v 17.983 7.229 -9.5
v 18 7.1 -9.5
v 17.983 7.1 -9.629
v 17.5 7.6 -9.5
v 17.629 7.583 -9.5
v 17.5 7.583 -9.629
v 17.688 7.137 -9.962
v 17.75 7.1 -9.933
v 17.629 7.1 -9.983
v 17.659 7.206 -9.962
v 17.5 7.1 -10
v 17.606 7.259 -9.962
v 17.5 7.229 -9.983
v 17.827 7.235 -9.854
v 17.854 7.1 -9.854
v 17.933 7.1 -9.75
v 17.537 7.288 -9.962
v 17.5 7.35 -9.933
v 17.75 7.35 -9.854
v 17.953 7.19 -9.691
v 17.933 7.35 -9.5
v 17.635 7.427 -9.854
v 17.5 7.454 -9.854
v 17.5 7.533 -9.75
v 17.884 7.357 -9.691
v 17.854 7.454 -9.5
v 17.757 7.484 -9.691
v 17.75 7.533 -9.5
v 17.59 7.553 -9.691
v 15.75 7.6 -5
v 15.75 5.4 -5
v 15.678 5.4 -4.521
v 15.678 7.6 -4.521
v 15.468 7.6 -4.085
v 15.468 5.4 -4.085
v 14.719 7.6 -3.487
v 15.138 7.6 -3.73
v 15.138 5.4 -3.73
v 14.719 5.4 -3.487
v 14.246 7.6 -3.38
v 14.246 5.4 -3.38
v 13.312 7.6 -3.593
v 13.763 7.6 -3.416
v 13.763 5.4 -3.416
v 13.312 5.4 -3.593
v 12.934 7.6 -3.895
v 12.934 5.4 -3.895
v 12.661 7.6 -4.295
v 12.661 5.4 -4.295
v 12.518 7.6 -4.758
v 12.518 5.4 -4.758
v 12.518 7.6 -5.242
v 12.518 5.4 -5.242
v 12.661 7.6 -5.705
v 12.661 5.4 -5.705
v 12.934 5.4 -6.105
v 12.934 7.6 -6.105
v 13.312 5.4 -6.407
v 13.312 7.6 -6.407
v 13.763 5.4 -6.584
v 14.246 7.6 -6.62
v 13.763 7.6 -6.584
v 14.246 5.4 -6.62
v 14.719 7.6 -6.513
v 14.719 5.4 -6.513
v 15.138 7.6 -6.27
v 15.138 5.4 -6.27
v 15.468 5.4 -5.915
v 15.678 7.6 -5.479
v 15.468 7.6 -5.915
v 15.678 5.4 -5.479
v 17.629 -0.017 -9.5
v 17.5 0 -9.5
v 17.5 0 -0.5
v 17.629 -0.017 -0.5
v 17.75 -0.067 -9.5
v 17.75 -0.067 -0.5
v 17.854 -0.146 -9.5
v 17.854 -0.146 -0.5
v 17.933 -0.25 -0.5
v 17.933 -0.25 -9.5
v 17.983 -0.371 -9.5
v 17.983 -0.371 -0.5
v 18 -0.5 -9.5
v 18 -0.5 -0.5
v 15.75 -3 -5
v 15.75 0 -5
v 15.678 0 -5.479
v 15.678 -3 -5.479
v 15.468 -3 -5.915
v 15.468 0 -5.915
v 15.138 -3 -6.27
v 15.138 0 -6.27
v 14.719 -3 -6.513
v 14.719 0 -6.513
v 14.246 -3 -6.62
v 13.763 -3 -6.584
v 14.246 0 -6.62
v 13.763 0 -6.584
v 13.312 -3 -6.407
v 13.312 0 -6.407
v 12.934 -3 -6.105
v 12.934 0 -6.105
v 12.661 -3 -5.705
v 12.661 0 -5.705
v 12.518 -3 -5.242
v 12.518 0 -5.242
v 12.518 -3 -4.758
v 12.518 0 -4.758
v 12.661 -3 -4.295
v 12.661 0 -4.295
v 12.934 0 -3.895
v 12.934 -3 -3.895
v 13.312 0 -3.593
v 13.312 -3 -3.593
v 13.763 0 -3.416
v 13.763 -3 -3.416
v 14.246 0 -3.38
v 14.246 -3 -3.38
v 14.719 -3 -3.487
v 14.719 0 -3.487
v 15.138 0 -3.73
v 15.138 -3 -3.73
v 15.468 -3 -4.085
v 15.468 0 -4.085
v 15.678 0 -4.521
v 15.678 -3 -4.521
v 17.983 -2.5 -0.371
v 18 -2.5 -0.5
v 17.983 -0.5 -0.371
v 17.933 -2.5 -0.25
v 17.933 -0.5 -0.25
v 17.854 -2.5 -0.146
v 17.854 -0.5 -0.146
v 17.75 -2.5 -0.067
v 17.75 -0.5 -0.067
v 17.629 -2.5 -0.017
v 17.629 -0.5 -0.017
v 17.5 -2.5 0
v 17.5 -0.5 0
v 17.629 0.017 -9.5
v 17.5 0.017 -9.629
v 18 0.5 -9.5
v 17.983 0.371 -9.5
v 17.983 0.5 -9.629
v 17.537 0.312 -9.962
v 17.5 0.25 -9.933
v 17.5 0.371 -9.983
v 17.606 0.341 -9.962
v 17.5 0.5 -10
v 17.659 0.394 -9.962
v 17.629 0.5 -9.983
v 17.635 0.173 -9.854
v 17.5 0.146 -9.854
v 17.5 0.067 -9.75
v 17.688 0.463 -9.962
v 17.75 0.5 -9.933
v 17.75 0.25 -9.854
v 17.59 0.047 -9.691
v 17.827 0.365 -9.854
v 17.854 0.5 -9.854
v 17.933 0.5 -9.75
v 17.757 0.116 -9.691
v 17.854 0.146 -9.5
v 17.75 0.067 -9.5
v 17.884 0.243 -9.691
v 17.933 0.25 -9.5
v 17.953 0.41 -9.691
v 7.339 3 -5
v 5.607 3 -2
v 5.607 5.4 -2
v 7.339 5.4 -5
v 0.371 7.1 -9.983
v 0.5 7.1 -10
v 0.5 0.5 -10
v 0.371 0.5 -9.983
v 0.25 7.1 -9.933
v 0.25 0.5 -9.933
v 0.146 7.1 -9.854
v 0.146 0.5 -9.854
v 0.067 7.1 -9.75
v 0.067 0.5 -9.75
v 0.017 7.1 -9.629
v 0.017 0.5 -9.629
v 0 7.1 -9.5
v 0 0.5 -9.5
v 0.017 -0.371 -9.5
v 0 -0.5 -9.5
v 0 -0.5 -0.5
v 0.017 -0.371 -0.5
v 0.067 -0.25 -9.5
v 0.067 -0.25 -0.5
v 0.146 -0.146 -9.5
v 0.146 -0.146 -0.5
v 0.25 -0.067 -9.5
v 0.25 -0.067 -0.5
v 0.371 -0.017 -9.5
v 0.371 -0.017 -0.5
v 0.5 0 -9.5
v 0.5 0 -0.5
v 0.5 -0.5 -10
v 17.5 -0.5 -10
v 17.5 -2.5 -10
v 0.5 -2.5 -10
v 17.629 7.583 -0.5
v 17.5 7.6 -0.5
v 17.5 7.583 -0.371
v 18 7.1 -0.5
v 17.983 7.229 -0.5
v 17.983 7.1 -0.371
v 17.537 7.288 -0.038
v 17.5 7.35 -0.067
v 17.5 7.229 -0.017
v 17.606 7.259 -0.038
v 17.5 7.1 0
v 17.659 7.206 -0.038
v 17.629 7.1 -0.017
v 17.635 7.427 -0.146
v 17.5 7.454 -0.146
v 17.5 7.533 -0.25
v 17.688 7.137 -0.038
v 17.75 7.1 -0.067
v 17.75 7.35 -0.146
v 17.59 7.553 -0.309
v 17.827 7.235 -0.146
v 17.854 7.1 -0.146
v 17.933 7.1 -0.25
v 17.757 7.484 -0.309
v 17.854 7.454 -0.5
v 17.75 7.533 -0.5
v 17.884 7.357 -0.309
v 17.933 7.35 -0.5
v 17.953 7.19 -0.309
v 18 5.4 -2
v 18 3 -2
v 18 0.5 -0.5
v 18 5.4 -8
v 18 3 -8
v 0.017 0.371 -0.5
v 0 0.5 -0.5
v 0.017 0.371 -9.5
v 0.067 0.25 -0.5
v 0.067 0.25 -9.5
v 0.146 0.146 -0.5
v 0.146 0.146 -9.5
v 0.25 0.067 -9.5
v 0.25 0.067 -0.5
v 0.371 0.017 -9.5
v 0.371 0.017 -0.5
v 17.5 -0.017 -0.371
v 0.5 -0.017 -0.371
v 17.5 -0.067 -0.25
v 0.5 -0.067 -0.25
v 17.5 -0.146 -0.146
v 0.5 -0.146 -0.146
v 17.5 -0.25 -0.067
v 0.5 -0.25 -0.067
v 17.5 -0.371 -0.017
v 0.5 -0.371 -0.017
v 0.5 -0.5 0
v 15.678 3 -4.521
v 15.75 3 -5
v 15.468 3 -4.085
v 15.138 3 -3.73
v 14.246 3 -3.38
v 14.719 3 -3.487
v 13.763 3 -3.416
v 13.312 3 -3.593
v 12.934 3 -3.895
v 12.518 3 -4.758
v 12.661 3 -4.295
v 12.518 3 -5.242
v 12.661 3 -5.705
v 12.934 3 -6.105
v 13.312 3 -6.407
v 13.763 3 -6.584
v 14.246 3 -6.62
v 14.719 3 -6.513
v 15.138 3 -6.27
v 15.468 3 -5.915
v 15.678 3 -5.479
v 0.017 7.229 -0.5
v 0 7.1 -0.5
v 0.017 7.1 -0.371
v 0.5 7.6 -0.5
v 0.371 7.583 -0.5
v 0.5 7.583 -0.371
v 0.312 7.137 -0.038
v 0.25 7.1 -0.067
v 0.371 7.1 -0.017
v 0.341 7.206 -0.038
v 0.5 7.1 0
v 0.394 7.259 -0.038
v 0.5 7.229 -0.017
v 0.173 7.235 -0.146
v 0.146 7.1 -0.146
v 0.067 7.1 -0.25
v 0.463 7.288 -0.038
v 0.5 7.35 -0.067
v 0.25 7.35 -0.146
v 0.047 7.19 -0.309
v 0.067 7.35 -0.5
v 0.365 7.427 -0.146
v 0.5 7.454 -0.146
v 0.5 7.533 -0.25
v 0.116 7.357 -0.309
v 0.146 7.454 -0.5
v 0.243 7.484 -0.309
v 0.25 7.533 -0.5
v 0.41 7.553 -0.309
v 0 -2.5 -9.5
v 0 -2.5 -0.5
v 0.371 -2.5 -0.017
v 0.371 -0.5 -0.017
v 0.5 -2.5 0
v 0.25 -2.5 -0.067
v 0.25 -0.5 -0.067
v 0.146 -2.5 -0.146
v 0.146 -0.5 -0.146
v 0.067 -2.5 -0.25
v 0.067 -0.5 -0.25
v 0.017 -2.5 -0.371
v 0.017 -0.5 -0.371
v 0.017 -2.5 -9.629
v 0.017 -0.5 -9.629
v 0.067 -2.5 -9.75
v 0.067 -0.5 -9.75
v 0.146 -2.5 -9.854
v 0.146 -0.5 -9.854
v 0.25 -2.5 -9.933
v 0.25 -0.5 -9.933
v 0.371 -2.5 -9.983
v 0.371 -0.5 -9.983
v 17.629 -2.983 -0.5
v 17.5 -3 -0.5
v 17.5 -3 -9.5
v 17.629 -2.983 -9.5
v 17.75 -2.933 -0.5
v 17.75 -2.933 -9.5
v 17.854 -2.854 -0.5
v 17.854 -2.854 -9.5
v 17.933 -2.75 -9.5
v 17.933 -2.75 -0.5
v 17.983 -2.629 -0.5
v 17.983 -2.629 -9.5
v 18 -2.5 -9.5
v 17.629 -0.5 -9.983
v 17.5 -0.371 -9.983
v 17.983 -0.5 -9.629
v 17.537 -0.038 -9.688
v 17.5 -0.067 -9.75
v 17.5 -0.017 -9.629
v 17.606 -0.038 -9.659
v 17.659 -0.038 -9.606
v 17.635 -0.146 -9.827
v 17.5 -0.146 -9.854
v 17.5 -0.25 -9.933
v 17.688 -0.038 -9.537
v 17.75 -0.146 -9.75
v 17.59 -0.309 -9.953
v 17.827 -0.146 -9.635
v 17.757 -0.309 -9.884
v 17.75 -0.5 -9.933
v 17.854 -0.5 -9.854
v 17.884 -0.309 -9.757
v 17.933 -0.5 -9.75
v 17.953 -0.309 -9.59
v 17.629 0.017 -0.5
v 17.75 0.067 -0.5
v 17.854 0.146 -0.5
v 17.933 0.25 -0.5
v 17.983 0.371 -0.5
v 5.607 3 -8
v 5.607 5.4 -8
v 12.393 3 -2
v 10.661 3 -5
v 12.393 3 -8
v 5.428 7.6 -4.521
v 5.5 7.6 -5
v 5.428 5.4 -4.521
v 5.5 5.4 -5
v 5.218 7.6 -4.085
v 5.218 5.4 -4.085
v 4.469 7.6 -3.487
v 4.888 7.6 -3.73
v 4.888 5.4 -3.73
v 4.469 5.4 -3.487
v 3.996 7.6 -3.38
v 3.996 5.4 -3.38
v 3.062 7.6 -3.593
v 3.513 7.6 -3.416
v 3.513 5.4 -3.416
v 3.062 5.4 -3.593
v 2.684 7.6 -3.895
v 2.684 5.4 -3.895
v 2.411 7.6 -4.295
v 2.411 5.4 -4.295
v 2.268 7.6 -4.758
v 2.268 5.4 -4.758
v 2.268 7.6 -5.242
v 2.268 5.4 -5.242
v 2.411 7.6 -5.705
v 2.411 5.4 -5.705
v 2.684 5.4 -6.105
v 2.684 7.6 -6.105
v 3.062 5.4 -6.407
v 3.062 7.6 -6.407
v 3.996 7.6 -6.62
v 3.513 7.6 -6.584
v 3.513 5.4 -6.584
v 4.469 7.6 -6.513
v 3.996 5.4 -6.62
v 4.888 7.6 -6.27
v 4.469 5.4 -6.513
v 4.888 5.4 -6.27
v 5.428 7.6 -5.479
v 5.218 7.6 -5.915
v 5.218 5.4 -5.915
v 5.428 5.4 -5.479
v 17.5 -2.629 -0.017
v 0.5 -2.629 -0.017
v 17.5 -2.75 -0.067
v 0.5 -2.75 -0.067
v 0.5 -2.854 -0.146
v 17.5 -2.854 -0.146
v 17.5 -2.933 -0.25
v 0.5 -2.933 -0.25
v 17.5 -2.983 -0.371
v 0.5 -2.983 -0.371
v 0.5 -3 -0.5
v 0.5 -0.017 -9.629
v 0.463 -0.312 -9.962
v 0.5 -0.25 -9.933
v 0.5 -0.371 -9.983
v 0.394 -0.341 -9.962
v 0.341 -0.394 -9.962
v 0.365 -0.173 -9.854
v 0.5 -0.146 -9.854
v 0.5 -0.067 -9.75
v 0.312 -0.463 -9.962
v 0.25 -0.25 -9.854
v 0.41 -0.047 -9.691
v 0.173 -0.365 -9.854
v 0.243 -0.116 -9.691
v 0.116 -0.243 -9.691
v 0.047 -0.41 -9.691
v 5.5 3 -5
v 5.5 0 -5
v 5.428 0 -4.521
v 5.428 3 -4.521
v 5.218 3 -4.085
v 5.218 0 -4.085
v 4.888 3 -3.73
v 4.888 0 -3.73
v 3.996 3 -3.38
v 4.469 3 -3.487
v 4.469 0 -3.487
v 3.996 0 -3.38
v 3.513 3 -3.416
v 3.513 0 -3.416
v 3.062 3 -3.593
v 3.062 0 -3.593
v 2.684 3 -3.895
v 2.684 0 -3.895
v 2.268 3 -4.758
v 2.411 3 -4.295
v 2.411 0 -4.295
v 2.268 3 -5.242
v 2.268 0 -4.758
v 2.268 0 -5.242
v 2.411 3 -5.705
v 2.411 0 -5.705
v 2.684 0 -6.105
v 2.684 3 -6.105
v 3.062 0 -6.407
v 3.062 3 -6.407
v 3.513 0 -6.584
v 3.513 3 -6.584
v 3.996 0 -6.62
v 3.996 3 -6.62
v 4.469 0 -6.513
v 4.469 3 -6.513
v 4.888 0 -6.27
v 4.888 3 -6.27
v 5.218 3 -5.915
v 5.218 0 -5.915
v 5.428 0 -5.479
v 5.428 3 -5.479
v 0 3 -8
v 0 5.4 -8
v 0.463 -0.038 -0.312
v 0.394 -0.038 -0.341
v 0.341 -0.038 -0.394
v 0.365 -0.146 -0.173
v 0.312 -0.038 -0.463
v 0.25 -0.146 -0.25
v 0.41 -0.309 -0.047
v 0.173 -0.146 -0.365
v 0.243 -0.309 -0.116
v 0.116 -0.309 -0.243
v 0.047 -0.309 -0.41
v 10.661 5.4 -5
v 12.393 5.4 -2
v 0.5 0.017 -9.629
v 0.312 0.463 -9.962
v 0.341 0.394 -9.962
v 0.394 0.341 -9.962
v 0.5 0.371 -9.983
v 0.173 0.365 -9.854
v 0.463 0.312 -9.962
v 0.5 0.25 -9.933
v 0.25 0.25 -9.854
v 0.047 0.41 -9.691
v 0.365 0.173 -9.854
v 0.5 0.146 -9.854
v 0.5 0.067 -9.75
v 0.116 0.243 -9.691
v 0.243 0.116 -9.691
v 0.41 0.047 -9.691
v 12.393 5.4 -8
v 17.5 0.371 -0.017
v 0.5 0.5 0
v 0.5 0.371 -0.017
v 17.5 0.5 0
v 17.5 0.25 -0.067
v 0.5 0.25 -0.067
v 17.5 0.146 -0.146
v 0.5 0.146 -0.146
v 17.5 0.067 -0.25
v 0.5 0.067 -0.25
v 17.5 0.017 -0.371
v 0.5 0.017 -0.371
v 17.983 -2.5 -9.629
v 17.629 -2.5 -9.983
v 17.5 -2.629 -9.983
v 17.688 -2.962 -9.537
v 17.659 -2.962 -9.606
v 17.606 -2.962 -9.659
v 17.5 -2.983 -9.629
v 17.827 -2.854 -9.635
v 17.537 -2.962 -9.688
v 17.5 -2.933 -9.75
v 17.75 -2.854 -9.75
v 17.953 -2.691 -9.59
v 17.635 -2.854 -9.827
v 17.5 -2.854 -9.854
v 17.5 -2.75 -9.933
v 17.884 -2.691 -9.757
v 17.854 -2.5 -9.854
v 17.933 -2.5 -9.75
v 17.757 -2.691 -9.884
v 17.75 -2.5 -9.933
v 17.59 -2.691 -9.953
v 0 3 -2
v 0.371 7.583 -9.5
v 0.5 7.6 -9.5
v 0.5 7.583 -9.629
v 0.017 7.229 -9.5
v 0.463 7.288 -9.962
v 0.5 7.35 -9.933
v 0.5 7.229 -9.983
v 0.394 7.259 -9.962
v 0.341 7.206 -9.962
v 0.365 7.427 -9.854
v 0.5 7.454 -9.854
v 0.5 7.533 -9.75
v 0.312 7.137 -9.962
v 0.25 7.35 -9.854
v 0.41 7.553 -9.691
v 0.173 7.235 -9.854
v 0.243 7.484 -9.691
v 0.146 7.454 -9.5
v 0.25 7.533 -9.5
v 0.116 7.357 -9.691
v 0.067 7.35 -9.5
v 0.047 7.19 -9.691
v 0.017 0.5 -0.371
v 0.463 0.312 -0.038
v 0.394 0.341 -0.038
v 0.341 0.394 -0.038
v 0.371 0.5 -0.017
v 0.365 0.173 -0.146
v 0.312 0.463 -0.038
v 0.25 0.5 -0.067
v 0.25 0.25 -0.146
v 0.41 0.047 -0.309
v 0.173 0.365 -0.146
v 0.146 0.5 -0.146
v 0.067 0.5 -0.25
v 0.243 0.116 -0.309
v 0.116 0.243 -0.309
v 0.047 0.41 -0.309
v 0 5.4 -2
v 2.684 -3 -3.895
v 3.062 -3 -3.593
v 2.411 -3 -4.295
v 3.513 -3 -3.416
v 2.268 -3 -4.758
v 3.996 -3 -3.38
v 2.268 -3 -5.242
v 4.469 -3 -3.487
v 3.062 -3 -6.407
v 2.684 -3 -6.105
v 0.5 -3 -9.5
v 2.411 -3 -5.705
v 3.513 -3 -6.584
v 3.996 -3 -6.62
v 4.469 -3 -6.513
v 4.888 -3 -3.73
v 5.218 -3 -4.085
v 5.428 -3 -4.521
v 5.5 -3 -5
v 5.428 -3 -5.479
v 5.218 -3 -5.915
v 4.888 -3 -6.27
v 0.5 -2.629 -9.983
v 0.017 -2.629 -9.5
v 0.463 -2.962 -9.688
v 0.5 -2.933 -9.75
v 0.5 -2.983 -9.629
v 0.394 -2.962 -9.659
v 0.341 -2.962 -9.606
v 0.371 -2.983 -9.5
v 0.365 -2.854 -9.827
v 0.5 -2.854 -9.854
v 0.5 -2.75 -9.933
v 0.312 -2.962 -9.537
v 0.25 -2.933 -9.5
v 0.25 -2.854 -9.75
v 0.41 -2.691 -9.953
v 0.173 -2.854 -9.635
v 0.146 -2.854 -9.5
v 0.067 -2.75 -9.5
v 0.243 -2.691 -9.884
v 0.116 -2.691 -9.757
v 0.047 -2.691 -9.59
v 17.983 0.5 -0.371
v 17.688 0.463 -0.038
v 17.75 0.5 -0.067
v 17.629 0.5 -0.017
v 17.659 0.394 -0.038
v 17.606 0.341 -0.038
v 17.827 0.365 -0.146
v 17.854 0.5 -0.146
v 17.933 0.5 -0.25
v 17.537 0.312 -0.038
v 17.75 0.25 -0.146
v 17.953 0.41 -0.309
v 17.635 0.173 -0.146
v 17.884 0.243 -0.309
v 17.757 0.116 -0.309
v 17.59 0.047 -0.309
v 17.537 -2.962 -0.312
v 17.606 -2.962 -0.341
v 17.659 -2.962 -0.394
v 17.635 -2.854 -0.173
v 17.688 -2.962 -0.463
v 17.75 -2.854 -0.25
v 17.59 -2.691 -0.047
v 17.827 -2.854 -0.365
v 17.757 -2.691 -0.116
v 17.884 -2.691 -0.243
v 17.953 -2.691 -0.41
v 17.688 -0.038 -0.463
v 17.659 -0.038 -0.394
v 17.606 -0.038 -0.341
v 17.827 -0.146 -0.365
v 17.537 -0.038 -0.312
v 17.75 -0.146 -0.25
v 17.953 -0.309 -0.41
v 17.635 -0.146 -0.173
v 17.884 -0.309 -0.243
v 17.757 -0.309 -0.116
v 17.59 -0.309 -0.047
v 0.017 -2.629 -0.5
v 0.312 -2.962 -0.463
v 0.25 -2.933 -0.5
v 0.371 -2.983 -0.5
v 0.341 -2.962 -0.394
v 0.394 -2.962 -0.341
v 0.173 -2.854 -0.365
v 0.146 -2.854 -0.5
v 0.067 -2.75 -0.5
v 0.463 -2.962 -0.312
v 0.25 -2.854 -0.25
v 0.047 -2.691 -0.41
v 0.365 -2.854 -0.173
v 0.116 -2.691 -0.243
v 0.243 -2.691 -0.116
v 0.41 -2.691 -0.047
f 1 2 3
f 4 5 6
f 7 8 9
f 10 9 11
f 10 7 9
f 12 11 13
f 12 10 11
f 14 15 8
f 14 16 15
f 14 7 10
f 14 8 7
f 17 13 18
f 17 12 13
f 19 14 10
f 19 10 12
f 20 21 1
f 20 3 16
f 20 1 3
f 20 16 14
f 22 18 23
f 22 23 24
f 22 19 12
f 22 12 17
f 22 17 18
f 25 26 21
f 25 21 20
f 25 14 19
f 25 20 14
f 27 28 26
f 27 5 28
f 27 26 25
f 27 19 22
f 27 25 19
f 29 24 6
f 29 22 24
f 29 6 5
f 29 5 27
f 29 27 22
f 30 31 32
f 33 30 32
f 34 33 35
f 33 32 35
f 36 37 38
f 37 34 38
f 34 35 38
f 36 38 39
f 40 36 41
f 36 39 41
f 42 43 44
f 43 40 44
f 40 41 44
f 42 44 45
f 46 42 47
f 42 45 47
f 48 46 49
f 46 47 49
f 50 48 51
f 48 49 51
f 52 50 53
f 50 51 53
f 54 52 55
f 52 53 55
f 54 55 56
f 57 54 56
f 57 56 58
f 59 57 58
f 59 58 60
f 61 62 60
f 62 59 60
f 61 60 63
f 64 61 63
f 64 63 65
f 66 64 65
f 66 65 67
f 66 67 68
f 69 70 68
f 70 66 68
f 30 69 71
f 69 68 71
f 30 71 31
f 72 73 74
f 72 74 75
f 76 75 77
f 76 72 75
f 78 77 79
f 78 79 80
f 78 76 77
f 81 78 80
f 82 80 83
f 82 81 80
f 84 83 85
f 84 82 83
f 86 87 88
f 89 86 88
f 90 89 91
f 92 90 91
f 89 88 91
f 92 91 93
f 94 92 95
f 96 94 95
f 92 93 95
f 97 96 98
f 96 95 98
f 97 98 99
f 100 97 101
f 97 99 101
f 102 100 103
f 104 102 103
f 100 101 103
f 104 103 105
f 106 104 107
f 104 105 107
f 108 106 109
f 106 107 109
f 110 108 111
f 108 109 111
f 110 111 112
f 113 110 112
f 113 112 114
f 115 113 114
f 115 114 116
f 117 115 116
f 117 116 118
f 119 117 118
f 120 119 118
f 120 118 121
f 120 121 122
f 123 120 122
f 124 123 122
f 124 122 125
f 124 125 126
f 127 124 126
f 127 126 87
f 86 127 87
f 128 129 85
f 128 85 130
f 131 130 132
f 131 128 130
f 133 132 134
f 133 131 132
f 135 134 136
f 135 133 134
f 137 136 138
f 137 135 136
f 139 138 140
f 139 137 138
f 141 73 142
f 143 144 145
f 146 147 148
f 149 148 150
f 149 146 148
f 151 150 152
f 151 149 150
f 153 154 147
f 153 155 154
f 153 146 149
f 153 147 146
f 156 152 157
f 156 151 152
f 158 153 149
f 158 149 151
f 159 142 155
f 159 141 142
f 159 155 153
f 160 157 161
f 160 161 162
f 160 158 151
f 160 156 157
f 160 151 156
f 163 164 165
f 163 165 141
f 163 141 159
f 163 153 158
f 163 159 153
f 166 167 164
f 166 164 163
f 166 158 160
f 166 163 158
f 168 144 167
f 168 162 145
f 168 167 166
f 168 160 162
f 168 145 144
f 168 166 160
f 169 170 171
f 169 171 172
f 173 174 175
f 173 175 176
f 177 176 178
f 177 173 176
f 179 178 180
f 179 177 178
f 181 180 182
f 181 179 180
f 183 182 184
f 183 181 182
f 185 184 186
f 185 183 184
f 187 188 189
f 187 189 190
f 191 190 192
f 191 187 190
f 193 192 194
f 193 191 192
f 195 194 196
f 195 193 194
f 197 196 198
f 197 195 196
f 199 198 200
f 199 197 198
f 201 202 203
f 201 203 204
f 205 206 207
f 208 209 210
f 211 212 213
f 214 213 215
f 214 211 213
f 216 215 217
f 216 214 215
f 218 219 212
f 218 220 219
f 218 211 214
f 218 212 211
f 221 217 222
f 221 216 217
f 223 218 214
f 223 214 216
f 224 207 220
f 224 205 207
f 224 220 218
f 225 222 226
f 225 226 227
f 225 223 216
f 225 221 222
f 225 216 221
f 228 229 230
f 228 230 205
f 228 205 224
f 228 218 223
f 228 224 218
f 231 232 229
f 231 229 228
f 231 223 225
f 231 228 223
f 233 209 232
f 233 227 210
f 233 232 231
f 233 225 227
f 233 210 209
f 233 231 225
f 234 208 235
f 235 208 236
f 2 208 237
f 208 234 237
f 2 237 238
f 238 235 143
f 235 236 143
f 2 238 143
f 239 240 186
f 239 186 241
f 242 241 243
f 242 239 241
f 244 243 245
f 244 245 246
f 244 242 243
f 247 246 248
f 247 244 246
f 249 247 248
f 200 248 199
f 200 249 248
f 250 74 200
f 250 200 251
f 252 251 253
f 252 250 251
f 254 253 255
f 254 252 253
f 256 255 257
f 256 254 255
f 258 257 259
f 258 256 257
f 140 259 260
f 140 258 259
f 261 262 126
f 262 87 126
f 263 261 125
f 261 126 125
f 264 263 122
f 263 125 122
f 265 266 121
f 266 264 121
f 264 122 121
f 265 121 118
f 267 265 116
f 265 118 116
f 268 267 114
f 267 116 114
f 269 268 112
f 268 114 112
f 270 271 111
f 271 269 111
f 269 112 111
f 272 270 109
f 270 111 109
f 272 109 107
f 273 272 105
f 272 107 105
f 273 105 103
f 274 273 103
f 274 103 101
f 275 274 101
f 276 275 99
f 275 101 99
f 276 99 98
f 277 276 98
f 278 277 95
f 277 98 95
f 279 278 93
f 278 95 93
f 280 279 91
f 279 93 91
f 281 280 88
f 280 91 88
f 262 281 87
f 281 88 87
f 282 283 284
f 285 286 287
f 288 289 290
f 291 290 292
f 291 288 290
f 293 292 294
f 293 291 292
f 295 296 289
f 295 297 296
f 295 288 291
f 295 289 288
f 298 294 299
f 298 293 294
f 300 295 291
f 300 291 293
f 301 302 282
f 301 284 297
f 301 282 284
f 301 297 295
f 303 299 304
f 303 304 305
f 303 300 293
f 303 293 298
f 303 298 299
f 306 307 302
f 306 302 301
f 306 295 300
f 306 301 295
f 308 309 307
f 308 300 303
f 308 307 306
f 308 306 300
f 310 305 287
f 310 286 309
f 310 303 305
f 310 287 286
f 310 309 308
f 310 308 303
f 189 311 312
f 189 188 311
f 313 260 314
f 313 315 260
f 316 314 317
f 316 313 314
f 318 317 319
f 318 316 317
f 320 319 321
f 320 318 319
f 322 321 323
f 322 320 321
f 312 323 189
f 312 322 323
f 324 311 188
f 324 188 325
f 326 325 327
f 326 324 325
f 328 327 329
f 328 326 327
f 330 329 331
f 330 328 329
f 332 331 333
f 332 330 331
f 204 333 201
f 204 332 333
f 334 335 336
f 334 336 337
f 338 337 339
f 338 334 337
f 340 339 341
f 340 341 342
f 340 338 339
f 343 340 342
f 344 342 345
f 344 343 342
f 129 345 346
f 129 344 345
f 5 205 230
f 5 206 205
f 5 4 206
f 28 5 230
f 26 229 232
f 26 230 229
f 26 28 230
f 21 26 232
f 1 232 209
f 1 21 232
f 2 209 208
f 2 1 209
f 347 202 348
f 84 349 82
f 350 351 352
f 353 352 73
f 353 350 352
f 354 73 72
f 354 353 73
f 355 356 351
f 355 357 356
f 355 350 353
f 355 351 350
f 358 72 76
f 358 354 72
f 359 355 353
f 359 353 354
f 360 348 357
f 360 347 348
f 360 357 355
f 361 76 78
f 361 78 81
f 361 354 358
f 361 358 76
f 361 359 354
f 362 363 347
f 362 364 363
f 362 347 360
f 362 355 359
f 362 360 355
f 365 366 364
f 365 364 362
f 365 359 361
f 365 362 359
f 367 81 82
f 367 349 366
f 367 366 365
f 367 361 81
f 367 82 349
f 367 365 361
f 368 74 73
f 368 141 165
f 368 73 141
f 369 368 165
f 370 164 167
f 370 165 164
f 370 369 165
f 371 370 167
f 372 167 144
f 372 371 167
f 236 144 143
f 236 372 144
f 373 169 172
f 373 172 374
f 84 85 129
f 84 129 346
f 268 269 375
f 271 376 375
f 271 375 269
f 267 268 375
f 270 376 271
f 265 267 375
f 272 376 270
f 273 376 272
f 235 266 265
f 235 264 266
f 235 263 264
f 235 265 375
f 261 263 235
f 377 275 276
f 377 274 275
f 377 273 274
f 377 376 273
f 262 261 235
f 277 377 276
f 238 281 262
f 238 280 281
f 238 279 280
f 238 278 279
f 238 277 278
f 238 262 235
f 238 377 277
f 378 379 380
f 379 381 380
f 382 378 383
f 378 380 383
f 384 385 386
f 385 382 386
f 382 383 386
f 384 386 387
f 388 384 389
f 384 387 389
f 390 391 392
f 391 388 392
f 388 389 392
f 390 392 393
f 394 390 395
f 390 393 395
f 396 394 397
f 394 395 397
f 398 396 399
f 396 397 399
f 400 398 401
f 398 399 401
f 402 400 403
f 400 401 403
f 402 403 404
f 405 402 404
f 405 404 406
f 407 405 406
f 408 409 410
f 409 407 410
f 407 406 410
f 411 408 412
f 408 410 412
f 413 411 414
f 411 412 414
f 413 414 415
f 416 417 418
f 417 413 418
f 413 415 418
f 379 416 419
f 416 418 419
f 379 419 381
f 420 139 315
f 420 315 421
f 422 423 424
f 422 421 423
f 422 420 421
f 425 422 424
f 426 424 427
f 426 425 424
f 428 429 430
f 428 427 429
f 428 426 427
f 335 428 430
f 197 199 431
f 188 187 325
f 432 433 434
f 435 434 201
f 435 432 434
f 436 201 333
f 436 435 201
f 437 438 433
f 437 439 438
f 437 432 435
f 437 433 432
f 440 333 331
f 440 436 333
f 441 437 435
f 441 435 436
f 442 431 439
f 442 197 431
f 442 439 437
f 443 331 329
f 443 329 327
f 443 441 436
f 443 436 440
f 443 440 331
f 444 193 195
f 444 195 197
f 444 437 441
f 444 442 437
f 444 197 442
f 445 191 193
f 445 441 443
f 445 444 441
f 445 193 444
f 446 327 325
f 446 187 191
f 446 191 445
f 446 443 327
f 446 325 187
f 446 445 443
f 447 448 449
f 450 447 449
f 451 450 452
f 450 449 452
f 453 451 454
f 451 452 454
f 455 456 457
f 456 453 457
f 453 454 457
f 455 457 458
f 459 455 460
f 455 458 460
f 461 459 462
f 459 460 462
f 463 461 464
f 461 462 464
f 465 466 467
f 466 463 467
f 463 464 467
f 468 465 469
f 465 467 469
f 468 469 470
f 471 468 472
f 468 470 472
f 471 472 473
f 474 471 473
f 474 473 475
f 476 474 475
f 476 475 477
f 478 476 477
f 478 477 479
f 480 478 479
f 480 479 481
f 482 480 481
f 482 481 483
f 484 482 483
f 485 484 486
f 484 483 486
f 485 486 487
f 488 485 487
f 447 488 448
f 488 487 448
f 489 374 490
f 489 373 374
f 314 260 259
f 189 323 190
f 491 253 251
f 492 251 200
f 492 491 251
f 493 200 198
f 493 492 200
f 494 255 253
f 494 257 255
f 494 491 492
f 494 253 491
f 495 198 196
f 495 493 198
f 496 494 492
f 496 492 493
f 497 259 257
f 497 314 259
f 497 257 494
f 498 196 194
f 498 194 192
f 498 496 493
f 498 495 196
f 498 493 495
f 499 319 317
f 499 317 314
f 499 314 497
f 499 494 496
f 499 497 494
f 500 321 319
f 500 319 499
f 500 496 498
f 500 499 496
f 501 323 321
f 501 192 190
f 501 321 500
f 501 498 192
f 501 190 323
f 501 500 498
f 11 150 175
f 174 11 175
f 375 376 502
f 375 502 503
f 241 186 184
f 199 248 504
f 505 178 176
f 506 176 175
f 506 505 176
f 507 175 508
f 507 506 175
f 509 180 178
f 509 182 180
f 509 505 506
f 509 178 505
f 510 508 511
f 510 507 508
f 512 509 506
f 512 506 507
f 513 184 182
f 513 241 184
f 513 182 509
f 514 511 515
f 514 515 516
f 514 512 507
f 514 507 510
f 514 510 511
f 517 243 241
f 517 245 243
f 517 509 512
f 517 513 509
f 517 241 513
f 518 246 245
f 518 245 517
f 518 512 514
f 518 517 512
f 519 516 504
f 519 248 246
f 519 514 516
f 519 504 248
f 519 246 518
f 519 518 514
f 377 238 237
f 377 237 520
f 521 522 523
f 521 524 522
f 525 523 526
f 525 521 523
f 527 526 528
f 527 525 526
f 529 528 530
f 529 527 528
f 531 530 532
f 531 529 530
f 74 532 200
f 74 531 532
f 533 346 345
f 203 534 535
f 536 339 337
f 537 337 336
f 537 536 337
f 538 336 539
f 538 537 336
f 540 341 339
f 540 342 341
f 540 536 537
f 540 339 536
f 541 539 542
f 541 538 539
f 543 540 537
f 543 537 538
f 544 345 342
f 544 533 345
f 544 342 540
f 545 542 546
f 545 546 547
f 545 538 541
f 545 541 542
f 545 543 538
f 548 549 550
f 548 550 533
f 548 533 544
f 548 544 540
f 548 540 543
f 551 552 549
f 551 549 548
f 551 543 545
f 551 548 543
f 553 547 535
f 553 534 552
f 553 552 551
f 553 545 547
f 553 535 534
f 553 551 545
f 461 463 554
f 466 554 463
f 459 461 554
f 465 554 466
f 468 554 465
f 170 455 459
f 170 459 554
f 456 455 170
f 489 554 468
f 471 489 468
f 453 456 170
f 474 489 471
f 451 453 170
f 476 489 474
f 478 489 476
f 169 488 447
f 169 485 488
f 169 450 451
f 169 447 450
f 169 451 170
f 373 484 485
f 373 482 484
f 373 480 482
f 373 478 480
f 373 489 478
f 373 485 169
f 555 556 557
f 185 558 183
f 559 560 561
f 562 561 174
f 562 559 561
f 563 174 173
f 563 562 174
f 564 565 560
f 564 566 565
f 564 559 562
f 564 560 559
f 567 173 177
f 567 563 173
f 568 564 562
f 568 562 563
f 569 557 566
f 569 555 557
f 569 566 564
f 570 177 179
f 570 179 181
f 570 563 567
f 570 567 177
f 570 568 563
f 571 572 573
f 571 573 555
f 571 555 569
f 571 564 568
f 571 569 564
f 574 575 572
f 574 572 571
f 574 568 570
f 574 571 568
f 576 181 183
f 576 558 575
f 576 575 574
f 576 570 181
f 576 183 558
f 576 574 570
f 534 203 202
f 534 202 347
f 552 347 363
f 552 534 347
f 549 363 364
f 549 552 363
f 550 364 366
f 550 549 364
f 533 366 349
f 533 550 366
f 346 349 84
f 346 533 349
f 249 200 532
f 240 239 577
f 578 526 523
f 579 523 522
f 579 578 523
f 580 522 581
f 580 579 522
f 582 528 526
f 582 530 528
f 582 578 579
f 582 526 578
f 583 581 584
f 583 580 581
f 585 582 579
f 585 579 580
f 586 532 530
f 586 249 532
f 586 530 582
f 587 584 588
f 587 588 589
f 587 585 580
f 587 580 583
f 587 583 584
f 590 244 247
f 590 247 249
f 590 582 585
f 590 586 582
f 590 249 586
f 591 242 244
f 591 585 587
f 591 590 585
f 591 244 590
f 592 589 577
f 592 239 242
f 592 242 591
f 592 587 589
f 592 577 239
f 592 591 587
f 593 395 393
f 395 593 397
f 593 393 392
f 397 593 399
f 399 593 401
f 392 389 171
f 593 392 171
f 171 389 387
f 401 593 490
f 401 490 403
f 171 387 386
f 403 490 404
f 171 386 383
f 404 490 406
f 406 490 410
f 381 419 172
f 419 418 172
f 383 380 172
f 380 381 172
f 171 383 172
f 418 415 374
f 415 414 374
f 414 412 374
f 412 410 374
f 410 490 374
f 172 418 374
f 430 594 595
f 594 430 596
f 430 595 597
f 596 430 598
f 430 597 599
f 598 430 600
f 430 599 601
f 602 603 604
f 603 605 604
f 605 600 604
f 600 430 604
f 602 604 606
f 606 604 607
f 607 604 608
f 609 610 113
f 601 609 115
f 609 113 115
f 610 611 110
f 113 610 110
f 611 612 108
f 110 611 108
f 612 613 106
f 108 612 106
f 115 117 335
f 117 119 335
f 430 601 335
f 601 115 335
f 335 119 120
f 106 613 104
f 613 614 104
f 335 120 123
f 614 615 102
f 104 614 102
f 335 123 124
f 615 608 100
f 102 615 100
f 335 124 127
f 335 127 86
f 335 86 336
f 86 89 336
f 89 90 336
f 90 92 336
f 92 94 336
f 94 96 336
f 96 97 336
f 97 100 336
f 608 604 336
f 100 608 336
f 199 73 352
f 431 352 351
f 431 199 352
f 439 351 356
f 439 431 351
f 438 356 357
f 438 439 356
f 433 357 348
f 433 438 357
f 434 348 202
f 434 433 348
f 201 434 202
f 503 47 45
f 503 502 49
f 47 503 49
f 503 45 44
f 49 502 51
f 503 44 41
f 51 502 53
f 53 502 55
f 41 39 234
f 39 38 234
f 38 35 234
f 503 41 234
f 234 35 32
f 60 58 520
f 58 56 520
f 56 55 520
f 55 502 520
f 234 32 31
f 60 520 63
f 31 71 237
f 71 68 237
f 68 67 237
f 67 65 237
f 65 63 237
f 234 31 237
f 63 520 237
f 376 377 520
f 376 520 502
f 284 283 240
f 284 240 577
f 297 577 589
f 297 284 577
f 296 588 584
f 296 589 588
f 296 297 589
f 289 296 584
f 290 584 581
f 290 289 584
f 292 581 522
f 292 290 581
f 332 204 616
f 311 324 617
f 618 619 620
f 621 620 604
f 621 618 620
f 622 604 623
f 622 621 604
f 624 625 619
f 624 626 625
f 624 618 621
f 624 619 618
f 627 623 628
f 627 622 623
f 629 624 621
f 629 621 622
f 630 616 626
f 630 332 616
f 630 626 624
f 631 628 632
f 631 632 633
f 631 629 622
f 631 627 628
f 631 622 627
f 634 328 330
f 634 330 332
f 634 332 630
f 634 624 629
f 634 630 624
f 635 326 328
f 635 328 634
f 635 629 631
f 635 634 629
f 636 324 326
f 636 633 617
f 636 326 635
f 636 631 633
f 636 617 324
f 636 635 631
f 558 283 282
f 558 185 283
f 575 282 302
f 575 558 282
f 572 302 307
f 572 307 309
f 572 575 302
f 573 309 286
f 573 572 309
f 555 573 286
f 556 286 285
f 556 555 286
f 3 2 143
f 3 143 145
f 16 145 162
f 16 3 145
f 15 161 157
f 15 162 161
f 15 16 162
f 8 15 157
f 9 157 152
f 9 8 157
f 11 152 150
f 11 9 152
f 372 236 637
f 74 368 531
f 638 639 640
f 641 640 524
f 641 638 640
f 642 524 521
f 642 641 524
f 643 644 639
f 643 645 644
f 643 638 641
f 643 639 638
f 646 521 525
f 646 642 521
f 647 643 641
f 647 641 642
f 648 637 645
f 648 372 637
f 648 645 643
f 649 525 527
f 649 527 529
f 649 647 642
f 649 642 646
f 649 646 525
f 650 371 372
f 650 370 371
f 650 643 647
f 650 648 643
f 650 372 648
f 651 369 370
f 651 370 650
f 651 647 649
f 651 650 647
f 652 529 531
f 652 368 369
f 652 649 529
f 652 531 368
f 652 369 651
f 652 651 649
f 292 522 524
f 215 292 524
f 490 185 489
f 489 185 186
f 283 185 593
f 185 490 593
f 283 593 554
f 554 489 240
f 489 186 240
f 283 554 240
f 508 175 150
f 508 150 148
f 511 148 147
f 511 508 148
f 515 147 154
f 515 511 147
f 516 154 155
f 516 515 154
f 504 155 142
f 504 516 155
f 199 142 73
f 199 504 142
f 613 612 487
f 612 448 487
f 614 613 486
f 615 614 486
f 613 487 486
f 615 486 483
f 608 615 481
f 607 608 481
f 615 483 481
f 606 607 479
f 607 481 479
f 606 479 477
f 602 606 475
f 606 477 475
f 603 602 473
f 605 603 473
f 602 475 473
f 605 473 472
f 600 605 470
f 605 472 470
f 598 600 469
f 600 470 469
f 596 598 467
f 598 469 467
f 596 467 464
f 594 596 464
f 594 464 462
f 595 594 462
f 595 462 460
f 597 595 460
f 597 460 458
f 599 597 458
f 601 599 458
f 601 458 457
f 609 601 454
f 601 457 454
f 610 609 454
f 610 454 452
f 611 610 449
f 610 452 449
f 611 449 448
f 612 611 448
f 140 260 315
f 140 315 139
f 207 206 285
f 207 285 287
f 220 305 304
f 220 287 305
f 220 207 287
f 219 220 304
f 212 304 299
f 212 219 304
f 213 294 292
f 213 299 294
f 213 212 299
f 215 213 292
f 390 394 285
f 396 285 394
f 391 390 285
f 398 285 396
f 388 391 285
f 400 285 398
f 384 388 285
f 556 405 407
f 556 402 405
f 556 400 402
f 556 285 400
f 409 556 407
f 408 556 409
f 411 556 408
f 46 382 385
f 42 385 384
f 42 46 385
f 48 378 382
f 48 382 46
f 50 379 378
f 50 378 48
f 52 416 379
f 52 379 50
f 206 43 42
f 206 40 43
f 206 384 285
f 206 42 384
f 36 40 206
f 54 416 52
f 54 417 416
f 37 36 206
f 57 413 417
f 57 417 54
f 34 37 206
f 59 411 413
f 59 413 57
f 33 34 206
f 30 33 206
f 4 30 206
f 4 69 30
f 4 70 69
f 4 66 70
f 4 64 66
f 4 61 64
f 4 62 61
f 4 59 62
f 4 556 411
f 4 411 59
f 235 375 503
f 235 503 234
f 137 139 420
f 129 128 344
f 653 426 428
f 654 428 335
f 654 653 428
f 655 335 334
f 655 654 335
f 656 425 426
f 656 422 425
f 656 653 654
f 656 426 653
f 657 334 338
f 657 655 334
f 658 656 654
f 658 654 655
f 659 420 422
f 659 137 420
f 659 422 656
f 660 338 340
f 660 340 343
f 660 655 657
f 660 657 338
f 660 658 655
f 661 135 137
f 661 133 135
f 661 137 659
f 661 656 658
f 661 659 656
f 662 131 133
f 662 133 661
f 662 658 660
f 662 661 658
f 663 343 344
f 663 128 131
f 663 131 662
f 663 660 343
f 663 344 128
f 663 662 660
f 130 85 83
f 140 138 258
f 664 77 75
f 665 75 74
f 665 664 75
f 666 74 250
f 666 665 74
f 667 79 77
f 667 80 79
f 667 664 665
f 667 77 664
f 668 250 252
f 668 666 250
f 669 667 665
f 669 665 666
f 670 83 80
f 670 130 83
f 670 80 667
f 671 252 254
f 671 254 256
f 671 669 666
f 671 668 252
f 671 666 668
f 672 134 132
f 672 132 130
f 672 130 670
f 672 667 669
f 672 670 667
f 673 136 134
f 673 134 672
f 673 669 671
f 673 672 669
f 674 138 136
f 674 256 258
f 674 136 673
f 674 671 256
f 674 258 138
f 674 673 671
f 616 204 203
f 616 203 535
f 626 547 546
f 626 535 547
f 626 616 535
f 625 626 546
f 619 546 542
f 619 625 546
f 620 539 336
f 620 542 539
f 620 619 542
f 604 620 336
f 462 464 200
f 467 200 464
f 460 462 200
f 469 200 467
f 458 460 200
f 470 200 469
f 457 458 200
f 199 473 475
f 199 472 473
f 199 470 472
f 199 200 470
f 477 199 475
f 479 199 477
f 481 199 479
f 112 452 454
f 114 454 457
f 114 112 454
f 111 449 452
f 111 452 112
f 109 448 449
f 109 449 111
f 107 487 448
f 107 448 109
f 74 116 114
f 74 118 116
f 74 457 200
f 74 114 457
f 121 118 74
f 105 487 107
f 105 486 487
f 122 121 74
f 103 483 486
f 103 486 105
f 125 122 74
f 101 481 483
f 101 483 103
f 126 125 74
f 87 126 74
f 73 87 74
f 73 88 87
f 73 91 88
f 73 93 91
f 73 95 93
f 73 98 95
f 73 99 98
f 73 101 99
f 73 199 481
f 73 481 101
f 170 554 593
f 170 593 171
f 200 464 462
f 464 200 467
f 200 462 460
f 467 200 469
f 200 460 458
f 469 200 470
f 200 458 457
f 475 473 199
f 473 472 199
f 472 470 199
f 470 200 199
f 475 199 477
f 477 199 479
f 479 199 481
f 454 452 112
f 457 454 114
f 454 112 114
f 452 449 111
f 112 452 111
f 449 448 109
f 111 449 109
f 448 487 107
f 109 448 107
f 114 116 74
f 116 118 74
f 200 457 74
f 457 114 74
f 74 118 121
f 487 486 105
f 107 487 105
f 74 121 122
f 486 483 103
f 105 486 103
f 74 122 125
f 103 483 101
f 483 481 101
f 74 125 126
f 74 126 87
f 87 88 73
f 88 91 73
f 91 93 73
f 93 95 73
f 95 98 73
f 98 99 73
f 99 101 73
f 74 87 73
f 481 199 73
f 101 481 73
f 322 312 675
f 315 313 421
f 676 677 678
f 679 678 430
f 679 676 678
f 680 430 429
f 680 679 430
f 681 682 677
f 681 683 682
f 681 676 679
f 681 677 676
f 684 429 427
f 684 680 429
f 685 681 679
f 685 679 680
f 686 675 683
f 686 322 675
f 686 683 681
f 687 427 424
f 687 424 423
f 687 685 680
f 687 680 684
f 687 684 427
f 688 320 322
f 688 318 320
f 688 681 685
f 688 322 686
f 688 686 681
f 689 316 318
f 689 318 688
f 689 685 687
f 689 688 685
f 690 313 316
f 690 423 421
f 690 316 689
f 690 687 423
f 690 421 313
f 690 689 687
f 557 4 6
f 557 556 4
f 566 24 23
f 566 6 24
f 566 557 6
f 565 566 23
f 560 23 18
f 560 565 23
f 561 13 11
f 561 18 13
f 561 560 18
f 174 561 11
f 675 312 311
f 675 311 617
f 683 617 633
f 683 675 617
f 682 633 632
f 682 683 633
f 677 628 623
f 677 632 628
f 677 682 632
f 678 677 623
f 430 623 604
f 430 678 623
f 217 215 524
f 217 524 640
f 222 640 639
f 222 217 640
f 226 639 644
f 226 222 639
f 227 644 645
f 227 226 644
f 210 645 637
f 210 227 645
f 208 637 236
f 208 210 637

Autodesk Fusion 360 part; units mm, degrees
sketch "Sketch1" plane through (0, 0, 0) normal (0, 1, 0) x (1, 0, 0)
  line L0 (0, 0) -> (18, 0)
  line L1 (18, 0) -> (18, 10)
  line L2 (18, 10) -> (0, 10)
  line L3 (0, 10) -> (0, 0)
  line L4 (0, 5) -> (18, 5) construction
  line L5 (7.3391, 5) -> (5.6071, 8)
  line L6 (5.6071, 8) -> (2.1429, 8)
  line L7 (2.1429, 8) -> (0.4109, 5) construction
  line L8 (0.4109, 5) -> (2.1429, 2) construction
  line L9 (2.1429, 2) -> (5.6071, 2)
  line L10 (5.6071, 2) -> (7.3391, 5)
  line L11 (15.8571, 8) -> (12.3929, 8)
  line L12 (12.3929, 8) -> (10.6609, 5)
  line L13 (10.6609, 5) -> (12.3929, 2)
  line L14 (12.3929, 2) -> (15.8571, 2)
  line L15 (15.8571, 2) -> (17.5891, 5) construction
  line L16 (17.5891, 5) -> (15.8571, 8) construction
  line L17 (2.1429, 8) -> (0, 8)
  line L18 (2.1429, 2) -> (0, 2)
  line L19 (15.8571, 8) -> (18, 8)
  line L20 (15.8571, 2) -> (18, 2)
  circle A0 centre (14.125, 5) radius 1.625
  circle A1 centre (3.875, 5) radius 1.625
  line L21 (7.3391, 5) -> (10.6609, 5) construction
  point P0 (3.875, 5)
  point P1 (14.125, 5)
  dimension "d2" = 3
  dimension "d3" = 3.25
  dimension "d4" = 3.25
  dimension "d5" = 10
  dimension "d6" = 18
  dimension "d8" = 3
  dimension "d9" = 10.25
extrude "Extrude1" add sketch "Sketch1" along normal blind 7.6 contours L0 L1 L2 L3 L5 L6 L9 L10 L11 L12 L13 L14 L17 L18 L19 L20 | L3 L5 L6 L9 L10 L17 L18 | L1 L11 L12 L13 L14 L19 L20 | A0 | A1 makes body 1
extrude "Extrude2" cut sketch "Sketch1" along normal blind 2.4 from surface at 3 contours L3 L5 L6 L9 L10 L17 L18 | L1 L11 L12 L13 L14 L19 L20 bodies 1
extrude "Extrude3" cut sketch "Sketch1" along normal up to surface (7.6 mm away) contours A0 | A1 bodies 1
extrude "Extrude4" add sketch "Sketch1" against normal blind 3 separate body makes body 2
fillet "Fillet1" radius 0.5 4 edges at (18, 7.6, -5) (18, 0, -5) (0, 0, -5) (0, 7.6, -5) 2 faces at (6, 5.0667, -10) (12, 5.0667, 0) on bodies 1
fillet "Fillet2" radius 0.5 4 faces at (0, -1, -6.6667) (12, -2, -10) (6, -2, 0) (18, -1, -3.3333) on bodies 2
equation "d2 = 5.5 mm / 2 + 0.25 mm"
equation "d8 = ( 5.5 / 2 ) * 1 mm + 0.25 mm"
equation "d9 = d3 + 7 mm"
equation "d10 = 10 mm - 2.4 mm"
